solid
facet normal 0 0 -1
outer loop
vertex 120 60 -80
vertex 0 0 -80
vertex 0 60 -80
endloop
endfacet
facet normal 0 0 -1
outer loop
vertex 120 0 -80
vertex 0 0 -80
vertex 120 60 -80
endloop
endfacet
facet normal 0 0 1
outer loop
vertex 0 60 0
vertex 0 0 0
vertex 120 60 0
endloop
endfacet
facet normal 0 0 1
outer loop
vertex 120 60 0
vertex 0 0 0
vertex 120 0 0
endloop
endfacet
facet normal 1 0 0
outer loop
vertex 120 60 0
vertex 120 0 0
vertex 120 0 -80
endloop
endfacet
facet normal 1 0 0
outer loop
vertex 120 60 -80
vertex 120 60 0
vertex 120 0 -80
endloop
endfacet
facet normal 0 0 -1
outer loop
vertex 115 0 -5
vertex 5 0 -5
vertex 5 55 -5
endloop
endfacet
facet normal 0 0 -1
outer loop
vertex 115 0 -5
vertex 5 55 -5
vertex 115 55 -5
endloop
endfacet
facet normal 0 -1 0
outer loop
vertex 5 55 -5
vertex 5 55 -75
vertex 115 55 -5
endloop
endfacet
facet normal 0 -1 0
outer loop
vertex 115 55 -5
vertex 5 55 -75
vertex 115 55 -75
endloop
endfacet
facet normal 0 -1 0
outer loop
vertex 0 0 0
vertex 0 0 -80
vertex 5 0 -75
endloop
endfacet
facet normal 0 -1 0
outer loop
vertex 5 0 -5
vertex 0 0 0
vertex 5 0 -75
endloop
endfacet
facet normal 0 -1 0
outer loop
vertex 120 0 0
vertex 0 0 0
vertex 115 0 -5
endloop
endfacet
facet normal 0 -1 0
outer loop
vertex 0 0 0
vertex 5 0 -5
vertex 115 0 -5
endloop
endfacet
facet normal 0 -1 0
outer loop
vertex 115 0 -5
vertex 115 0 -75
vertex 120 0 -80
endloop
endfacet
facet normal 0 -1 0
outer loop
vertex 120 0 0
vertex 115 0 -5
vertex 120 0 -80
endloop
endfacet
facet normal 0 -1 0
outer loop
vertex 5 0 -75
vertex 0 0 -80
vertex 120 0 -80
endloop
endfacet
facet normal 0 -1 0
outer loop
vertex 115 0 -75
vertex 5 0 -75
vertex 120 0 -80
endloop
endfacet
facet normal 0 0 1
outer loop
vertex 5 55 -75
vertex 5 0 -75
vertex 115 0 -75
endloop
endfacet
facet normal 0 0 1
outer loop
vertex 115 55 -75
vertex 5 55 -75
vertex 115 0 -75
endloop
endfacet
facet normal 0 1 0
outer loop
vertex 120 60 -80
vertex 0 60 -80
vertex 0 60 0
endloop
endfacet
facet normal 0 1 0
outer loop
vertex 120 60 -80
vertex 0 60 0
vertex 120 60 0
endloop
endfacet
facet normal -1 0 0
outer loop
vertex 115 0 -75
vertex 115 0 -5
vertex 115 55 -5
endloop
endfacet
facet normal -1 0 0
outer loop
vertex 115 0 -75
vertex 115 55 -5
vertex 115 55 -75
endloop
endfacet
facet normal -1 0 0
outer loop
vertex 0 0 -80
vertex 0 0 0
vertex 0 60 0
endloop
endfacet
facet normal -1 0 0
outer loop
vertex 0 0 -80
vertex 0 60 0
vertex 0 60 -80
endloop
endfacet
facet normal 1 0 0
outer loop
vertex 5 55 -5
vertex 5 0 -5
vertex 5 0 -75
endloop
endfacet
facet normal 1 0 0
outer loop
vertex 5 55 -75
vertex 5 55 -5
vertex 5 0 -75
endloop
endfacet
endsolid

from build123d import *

# Parameters (mm, degrees)
SKETCH_1_W      = 120
SKETCH_1_H      = 80
EXTRUDE_1_DEPTH = 60
SHELL_1_T       = -5


with BuildPart() as part:
    # Эскиз1 → Бобышка-Вытянуть1 (new body)
    with BuildSketch(Plane(origin=(0, 0, 0), x_dir=(1, 0, 0), z_dir=(0, 1, 0))):
        with Locations((60, 40)):
            Rectangle(SKETCH_1_W, SKETCH_1_H)
    extrude(amount=EXTRUDE_1_DEPTH)

    # Оболочка1
    shell_1_openings = [part.faces().sort_by_distance(p)[0] for p in [
        (60, 0, -40),
    ]]
    offset(amount=SHELL_1_T, openings=shell_1_openings, kind=Kind.INTERSECTION)


solid = part.part
